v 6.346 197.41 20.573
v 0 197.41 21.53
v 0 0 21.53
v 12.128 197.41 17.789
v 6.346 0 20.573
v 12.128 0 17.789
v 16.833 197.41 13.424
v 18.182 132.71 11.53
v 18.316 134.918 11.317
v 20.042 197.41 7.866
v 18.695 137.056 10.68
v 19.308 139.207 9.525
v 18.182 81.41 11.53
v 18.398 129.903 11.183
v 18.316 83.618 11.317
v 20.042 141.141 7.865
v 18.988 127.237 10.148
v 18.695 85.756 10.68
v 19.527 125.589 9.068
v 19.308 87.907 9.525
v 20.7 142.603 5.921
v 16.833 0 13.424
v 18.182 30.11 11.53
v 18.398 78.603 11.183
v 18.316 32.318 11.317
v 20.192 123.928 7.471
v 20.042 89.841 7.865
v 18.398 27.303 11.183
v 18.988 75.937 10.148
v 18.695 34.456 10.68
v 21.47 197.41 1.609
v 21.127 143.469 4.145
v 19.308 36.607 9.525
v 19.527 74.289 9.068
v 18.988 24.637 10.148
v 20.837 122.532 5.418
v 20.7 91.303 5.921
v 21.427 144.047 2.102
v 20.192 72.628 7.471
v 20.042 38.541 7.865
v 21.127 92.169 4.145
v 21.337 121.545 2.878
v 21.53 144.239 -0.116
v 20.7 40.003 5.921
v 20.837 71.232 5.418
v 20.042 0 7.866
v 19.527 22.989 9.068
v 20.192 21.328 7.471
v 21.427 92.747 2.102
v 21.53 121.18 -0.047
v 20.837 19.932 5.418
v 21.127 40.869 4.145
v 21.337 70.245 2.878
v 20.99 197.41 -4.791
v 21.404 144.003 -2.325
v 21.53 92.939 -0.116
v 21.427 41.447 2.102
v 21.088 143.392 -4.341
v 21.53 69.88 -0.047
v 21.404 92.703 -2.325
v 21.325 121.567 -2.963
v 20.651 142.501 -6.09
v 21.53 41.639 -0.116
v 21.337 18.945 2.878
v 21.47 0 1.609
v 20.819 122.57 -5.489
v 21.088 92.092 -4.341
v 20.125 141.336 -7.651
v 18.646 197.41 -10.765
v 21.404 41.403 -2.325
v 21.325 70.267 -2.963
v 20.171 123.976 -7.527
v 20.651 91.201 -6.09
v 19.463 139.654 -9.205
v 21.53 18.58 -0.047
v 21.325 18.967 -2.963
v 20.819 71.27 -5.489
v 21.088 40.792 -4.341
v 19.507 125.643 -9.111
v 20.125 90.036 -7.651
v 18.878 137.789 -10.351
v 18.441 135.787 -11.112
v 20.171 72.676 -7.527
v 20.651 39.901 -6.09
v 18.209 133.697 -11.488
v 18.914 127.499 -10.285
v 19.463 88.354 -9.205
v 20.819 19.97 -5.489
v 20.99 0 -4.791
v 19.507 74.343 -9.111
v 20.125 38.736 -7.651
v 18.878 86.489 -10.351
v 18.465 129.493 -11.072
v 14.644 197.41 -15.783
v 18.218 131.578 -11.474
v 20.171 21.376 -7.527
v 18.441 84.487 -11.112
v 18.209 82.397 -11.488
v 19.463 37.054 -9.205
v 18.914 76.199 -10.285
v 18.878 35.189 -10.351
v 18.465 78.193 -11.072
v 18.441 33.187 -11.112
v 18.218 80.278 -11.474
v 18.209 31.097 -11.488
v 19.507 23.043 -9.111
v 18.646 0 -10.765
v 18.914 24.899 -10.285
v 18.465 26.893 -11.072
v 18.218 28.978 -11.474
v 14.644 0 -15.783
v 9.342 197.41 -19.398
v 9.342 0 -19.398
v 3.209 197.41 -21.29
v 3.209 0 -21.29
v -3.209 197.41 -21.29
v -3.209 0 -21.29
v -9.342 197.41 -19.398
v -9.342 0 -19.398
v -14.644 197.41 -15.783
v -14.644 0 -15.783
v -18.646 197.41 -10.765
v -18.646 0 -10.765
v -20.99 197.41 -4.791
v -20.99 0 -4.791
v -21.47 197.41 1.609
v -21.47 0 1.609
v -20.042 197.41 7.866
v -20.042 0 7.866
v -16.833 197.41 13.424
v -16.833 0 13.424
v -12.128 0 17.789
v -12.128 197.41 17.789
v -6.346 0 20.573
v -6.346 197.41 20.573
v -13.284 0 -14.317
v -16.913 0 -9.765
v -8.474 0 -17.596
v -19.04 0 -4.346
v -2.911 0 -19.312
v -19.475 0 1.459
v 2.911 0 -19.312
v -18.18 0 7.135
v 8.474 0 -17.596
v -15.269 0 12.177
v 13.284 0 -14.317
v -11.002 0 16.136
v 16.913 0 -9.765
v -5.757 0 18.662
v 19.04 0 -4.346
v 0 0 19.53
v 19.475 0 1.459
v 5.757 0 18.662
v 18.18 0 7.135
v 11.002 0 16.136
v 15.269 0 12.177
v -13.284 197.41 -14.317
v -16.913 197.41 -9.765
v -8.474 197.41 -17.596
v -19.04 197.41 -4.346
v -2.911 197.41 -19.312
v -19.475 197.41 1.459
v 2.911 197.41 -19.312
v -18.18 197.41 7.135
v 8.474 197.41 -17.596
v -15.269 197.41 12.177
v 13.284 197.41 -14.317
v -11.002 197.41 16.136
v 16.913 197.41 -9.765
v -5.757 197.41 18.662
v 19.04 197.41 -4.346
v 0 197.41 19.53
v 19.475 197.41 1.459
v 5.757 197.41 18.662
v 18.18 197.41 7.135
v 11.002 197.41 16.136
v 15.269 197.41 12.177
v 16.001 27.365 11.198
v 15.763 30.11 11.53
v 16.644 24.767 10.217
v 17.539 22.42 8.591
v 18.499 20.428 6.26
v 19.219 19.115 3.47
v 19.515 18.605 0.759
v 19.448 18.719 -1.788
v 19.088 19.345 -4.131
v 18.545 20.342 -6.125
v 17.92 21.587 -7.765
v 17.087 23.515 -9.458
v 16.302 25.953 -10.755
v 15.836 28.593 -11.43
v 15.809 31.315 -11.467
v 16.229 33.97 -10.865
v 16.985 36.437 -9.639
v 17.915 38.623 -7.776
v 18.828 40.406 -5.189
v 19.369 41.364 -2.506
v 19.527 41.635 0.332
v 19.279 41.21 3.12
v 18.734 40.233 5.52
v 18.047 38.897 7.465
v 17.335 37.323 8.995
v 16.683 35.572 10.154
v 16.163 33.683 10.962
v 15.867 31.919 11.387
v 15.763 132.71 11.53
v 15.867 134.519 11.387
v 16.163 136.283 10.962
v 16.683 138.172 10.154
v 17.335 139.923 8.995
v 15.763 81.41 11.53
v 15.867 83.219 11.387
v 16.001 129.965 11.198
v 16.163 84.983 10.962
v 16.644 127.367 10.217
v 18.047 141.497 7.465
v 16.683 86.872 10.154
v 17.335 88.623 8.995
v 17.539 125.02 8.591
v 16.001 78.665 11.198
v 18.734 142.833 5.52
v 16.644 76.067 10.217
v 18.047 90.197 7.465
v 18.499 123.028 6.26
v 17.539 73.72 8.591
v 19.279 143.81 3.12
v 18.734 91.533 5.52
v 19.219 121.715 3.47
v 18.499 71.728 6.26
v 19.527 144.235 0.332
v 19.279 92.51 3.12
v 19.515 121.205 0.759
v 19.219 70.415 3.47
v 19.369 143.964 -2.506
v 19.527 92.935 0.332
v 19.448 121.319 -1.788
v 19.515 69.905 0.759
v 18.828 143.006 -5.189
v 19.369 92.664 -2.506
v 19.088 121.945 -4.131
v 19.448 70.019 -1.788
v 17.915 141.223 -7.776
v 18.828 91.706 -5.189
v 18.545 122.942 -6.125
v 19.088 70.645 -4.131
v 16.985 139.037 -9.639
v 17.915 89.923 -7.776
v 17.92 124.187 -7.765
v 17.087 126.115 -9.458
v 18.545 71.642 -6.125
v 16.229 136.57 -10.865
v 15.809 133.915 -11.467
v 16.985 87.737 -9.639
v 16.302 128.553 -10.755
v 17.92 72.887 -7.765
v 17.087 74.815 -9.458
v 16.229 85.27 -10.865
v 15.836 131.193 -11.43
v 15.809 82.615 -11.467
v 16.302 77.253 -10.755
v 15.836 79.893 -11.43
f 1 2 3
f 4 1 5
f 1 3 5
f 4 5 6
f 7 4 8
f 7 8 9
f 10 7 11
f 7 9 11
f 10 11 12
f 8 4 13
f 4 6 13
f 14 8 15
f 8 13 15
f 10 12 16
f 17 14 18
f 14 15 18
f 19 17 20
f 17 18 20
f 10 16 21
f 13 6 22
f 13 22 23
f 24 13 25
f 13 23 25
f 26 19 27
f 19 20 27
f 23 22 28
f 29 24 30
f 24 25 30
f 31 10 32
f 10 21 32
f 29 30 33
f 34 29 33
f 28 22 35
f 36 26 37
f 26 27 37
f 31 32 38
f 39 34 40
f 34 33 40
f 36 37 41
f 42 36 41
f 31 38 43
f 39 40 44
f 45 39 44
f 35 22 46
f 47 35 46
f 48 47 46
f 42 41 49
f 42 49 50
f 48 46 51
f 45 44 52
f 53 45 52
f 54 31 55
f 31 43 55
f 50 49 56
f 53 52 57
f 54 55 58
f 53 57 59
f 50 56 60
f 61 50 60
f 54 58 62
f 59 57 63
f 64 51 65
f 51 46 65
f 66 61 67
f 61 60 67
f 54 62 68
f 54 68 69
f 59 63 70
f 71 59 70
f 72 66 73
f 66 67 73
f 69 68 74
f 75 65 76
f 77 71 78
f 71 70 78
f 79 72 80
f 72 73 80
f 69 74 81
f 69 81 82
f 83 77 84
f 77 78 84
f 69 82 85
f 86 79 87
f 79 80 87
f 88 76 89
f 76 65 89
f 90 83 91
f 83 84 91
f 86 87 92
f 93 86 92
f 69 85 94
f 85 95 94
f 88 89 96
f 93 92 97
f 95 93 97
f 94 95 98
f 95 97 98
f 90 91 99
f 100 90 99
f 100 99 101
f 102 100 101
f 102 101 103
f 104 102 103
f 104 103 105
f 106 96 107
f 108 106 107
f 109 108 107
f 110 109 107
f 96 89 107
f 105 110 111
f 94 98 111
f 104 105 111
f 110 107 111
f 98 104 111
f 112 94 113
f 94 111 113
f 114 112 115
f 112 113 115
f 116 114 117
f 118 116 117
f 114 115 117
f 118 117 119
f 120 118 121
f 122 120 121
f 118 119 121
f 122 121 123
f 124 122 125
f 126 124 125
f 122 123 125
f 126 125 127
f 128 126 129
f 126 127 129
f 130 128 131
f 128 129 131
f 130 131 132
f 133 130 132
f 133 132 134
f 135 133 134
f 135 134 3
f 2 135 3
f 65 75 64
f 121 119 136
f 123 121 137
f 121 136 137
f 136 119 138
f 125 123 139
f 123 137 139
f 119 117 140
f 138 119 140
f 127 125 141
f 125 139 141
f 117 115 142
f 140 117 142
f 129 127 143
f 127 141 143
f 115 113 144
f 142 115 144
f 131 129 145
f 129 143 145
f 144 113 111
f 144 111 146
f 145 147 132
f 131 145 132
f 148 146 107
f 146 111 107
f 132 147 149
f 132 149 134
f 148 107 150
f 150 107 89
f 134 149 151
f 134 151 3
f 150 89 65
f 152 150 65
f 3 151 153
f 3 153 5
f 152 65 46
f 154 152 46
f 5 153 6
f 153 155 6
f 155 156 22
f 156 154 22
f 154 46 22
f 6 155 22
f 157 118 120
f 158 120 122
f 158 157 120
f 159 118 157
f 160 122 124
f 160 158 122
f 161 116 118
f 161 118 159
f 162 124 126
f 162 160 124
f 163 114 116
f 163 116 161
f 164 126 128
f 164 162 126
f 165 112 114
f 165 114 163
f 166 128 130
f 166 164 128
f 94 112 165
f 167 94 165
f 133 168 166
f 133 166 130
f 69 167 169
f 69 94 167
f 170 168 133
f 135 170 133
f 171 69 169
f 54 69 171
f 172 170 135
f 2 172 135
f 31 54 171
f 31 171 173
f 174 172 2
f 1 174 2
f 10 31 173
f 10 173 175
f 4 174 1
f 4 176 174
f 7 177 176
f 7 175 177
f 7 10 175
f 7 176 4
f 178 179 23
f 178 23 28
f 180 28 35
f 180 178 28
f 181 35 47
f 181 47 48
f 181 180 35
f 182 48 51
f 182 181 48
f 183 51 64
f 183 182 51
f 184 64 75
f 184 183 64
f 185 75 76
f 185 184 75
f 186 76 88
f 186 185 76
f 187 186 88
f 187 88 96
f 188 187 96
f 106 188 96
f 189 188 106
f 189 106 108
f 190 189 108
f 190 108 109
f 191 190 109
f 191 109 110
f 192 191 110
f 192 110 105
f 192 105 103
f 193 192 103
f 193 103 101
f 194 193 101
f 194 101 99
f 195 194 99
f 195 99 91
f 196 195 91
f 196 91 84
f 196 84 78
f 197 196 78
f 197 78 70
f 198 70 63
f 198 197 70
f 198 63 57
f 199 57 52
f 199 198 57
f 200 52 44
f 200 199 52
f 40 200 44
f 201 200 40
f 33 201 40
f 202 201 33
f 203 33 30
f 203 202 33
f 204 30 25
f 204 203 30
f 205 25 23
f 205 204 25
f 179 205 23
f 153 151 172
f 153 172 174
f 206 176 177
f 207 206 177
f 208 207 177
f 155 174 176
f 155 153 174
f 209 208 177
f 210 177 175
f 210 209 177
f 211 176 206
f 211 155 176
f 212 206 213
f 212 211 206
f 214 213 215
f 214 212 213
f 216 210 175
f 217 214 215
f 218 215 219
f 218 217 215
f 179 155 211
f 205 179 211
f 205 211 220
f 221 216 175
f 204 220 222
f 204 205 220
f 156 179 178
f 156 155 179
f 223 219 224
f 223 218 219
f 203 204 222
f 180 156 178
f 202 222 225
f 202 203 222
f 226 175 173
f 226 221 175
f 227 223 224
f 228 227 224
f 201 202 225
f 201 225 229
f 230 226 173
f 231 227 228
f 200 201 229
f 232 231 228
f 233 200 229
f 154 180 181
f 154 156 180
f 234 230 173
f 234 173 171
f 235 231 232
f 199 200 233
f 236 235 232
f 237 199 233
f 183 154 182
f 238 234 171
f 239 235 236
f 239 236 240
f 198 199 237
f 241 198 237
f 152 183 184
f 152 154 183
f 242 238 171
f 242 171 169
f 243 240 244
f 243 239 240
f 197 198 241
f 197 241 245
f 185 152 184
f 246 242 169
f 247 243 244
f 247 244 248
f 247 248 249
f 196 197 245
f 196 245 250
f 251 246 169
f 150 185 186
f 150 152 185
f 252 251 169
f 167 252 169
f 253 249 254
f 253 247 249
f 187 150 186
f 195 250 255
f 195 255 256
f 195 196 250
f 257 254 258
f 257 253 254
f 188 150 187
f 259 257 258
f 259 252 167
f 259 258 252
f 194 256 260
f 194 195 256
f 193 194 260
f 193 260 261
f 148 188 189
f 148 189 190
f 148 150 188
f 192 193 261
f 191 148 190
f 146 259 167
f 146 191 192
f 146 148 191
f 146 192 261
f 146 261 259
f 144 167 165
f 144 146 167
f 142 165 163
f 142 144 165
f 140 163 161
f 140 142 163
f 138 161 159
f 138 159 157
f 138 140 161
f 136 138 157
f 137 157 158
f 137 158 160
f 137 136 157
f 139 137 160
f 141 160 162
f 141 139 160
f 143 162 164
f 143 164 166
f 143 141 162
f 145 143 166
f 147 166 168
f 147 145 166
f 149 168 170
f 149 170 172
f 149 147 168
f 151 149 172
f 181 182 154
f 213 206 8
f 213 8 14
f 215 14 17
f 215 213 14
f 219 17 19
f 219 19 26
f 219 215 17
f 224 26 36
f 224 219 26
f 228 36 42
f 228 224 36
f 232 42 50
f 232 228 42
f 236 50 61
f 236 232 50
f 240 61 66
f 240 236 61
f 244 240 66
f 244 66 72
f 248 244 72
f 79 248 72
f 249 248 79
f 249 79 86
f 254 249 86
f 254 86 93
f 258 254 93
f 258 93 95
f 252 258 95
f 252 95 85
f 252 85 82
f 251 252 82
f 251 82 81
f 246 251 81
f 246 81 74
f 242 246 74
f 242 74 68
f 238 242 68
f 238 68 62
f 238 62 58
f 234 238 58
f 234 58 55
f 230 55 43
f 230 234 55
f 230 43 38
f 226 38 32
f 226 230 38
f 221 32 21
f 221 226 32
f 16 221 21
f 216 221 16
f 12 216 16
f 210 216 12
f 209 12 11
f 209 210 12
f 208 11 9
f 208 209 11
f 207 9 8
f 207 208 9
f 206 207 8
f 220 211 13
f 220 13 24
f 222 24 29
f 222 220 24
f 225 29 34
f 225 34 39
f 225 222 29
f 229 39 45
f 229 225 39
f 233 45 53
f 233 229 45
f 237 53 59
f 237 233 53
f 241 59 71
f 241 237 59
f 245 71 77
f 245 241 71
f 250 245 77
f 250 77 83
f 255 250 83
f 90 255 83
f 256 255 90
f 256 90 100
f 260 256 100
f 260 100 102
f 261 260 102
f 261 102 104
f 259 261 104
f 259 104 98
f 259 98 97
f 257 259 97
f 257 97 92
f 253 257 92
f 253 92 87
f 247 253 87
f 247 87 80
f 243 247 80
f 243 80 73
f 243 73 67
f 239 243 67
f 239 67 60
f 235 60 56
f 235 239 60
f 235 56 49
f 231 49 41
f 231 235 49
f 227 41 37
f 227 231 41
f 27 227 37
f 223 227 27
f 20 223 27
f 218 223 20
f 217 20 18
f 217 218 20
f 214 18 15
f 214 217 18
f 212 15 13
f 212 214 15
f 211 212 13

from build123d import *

# Parameters (mm, degrees)
SKETCH1_R           = 21.53
SKETCH1_R_2         = 19.53
BOSS_EXTRUDE1_DEPTH = 197.41
SKETCH2_R           = 11.53
CUT_EXTRUDE1_DEPTH  = 200.744311308


with BuildPart() as part:
    # Sketch1 → Boss-Extrude1 (new body)
    with BuildSketch(Plane(origin=(0, 0, 0), x_dir=(1, 0, 0), z_dir=(0, 1, 0))):
        with Locations(Location((0, 0, 0), (0, 0, 270))):
            Circle(SKETCH1_R)
        with Locations(Location((0, 0, 0), (0, 0, 270))):
            Circle(SKETCH1_R_2, mode=Mode.SUBTRACT)
    extrude(amount=BOSS_EXTRUDE1_DEPTH)

    # Sketch2 → Cut-Extrude1 (cut, through all)
    with BuildSketch(Plane(origin=(0, 0, 0), x_dir=(0, 0, -1), z_dir=(1, 0, 0))):
        with Locations(Location((0, 132.71, 0), (0, 0, 180))):
            Circle(SKETCH2_R)
        with Locations(Location((0, 81.41, 0), (0, 0, 180))):
            Circle(SKETCH2_R)
        with Locations(Location((0, 30.11, 0), (0, 0, 180))):
            Circle(SKETCH2_R)
    extrude(amount=CUT_EXTRUDE1_DEPTH, mode=Mode.SUBTRACT)


solid = part.part
